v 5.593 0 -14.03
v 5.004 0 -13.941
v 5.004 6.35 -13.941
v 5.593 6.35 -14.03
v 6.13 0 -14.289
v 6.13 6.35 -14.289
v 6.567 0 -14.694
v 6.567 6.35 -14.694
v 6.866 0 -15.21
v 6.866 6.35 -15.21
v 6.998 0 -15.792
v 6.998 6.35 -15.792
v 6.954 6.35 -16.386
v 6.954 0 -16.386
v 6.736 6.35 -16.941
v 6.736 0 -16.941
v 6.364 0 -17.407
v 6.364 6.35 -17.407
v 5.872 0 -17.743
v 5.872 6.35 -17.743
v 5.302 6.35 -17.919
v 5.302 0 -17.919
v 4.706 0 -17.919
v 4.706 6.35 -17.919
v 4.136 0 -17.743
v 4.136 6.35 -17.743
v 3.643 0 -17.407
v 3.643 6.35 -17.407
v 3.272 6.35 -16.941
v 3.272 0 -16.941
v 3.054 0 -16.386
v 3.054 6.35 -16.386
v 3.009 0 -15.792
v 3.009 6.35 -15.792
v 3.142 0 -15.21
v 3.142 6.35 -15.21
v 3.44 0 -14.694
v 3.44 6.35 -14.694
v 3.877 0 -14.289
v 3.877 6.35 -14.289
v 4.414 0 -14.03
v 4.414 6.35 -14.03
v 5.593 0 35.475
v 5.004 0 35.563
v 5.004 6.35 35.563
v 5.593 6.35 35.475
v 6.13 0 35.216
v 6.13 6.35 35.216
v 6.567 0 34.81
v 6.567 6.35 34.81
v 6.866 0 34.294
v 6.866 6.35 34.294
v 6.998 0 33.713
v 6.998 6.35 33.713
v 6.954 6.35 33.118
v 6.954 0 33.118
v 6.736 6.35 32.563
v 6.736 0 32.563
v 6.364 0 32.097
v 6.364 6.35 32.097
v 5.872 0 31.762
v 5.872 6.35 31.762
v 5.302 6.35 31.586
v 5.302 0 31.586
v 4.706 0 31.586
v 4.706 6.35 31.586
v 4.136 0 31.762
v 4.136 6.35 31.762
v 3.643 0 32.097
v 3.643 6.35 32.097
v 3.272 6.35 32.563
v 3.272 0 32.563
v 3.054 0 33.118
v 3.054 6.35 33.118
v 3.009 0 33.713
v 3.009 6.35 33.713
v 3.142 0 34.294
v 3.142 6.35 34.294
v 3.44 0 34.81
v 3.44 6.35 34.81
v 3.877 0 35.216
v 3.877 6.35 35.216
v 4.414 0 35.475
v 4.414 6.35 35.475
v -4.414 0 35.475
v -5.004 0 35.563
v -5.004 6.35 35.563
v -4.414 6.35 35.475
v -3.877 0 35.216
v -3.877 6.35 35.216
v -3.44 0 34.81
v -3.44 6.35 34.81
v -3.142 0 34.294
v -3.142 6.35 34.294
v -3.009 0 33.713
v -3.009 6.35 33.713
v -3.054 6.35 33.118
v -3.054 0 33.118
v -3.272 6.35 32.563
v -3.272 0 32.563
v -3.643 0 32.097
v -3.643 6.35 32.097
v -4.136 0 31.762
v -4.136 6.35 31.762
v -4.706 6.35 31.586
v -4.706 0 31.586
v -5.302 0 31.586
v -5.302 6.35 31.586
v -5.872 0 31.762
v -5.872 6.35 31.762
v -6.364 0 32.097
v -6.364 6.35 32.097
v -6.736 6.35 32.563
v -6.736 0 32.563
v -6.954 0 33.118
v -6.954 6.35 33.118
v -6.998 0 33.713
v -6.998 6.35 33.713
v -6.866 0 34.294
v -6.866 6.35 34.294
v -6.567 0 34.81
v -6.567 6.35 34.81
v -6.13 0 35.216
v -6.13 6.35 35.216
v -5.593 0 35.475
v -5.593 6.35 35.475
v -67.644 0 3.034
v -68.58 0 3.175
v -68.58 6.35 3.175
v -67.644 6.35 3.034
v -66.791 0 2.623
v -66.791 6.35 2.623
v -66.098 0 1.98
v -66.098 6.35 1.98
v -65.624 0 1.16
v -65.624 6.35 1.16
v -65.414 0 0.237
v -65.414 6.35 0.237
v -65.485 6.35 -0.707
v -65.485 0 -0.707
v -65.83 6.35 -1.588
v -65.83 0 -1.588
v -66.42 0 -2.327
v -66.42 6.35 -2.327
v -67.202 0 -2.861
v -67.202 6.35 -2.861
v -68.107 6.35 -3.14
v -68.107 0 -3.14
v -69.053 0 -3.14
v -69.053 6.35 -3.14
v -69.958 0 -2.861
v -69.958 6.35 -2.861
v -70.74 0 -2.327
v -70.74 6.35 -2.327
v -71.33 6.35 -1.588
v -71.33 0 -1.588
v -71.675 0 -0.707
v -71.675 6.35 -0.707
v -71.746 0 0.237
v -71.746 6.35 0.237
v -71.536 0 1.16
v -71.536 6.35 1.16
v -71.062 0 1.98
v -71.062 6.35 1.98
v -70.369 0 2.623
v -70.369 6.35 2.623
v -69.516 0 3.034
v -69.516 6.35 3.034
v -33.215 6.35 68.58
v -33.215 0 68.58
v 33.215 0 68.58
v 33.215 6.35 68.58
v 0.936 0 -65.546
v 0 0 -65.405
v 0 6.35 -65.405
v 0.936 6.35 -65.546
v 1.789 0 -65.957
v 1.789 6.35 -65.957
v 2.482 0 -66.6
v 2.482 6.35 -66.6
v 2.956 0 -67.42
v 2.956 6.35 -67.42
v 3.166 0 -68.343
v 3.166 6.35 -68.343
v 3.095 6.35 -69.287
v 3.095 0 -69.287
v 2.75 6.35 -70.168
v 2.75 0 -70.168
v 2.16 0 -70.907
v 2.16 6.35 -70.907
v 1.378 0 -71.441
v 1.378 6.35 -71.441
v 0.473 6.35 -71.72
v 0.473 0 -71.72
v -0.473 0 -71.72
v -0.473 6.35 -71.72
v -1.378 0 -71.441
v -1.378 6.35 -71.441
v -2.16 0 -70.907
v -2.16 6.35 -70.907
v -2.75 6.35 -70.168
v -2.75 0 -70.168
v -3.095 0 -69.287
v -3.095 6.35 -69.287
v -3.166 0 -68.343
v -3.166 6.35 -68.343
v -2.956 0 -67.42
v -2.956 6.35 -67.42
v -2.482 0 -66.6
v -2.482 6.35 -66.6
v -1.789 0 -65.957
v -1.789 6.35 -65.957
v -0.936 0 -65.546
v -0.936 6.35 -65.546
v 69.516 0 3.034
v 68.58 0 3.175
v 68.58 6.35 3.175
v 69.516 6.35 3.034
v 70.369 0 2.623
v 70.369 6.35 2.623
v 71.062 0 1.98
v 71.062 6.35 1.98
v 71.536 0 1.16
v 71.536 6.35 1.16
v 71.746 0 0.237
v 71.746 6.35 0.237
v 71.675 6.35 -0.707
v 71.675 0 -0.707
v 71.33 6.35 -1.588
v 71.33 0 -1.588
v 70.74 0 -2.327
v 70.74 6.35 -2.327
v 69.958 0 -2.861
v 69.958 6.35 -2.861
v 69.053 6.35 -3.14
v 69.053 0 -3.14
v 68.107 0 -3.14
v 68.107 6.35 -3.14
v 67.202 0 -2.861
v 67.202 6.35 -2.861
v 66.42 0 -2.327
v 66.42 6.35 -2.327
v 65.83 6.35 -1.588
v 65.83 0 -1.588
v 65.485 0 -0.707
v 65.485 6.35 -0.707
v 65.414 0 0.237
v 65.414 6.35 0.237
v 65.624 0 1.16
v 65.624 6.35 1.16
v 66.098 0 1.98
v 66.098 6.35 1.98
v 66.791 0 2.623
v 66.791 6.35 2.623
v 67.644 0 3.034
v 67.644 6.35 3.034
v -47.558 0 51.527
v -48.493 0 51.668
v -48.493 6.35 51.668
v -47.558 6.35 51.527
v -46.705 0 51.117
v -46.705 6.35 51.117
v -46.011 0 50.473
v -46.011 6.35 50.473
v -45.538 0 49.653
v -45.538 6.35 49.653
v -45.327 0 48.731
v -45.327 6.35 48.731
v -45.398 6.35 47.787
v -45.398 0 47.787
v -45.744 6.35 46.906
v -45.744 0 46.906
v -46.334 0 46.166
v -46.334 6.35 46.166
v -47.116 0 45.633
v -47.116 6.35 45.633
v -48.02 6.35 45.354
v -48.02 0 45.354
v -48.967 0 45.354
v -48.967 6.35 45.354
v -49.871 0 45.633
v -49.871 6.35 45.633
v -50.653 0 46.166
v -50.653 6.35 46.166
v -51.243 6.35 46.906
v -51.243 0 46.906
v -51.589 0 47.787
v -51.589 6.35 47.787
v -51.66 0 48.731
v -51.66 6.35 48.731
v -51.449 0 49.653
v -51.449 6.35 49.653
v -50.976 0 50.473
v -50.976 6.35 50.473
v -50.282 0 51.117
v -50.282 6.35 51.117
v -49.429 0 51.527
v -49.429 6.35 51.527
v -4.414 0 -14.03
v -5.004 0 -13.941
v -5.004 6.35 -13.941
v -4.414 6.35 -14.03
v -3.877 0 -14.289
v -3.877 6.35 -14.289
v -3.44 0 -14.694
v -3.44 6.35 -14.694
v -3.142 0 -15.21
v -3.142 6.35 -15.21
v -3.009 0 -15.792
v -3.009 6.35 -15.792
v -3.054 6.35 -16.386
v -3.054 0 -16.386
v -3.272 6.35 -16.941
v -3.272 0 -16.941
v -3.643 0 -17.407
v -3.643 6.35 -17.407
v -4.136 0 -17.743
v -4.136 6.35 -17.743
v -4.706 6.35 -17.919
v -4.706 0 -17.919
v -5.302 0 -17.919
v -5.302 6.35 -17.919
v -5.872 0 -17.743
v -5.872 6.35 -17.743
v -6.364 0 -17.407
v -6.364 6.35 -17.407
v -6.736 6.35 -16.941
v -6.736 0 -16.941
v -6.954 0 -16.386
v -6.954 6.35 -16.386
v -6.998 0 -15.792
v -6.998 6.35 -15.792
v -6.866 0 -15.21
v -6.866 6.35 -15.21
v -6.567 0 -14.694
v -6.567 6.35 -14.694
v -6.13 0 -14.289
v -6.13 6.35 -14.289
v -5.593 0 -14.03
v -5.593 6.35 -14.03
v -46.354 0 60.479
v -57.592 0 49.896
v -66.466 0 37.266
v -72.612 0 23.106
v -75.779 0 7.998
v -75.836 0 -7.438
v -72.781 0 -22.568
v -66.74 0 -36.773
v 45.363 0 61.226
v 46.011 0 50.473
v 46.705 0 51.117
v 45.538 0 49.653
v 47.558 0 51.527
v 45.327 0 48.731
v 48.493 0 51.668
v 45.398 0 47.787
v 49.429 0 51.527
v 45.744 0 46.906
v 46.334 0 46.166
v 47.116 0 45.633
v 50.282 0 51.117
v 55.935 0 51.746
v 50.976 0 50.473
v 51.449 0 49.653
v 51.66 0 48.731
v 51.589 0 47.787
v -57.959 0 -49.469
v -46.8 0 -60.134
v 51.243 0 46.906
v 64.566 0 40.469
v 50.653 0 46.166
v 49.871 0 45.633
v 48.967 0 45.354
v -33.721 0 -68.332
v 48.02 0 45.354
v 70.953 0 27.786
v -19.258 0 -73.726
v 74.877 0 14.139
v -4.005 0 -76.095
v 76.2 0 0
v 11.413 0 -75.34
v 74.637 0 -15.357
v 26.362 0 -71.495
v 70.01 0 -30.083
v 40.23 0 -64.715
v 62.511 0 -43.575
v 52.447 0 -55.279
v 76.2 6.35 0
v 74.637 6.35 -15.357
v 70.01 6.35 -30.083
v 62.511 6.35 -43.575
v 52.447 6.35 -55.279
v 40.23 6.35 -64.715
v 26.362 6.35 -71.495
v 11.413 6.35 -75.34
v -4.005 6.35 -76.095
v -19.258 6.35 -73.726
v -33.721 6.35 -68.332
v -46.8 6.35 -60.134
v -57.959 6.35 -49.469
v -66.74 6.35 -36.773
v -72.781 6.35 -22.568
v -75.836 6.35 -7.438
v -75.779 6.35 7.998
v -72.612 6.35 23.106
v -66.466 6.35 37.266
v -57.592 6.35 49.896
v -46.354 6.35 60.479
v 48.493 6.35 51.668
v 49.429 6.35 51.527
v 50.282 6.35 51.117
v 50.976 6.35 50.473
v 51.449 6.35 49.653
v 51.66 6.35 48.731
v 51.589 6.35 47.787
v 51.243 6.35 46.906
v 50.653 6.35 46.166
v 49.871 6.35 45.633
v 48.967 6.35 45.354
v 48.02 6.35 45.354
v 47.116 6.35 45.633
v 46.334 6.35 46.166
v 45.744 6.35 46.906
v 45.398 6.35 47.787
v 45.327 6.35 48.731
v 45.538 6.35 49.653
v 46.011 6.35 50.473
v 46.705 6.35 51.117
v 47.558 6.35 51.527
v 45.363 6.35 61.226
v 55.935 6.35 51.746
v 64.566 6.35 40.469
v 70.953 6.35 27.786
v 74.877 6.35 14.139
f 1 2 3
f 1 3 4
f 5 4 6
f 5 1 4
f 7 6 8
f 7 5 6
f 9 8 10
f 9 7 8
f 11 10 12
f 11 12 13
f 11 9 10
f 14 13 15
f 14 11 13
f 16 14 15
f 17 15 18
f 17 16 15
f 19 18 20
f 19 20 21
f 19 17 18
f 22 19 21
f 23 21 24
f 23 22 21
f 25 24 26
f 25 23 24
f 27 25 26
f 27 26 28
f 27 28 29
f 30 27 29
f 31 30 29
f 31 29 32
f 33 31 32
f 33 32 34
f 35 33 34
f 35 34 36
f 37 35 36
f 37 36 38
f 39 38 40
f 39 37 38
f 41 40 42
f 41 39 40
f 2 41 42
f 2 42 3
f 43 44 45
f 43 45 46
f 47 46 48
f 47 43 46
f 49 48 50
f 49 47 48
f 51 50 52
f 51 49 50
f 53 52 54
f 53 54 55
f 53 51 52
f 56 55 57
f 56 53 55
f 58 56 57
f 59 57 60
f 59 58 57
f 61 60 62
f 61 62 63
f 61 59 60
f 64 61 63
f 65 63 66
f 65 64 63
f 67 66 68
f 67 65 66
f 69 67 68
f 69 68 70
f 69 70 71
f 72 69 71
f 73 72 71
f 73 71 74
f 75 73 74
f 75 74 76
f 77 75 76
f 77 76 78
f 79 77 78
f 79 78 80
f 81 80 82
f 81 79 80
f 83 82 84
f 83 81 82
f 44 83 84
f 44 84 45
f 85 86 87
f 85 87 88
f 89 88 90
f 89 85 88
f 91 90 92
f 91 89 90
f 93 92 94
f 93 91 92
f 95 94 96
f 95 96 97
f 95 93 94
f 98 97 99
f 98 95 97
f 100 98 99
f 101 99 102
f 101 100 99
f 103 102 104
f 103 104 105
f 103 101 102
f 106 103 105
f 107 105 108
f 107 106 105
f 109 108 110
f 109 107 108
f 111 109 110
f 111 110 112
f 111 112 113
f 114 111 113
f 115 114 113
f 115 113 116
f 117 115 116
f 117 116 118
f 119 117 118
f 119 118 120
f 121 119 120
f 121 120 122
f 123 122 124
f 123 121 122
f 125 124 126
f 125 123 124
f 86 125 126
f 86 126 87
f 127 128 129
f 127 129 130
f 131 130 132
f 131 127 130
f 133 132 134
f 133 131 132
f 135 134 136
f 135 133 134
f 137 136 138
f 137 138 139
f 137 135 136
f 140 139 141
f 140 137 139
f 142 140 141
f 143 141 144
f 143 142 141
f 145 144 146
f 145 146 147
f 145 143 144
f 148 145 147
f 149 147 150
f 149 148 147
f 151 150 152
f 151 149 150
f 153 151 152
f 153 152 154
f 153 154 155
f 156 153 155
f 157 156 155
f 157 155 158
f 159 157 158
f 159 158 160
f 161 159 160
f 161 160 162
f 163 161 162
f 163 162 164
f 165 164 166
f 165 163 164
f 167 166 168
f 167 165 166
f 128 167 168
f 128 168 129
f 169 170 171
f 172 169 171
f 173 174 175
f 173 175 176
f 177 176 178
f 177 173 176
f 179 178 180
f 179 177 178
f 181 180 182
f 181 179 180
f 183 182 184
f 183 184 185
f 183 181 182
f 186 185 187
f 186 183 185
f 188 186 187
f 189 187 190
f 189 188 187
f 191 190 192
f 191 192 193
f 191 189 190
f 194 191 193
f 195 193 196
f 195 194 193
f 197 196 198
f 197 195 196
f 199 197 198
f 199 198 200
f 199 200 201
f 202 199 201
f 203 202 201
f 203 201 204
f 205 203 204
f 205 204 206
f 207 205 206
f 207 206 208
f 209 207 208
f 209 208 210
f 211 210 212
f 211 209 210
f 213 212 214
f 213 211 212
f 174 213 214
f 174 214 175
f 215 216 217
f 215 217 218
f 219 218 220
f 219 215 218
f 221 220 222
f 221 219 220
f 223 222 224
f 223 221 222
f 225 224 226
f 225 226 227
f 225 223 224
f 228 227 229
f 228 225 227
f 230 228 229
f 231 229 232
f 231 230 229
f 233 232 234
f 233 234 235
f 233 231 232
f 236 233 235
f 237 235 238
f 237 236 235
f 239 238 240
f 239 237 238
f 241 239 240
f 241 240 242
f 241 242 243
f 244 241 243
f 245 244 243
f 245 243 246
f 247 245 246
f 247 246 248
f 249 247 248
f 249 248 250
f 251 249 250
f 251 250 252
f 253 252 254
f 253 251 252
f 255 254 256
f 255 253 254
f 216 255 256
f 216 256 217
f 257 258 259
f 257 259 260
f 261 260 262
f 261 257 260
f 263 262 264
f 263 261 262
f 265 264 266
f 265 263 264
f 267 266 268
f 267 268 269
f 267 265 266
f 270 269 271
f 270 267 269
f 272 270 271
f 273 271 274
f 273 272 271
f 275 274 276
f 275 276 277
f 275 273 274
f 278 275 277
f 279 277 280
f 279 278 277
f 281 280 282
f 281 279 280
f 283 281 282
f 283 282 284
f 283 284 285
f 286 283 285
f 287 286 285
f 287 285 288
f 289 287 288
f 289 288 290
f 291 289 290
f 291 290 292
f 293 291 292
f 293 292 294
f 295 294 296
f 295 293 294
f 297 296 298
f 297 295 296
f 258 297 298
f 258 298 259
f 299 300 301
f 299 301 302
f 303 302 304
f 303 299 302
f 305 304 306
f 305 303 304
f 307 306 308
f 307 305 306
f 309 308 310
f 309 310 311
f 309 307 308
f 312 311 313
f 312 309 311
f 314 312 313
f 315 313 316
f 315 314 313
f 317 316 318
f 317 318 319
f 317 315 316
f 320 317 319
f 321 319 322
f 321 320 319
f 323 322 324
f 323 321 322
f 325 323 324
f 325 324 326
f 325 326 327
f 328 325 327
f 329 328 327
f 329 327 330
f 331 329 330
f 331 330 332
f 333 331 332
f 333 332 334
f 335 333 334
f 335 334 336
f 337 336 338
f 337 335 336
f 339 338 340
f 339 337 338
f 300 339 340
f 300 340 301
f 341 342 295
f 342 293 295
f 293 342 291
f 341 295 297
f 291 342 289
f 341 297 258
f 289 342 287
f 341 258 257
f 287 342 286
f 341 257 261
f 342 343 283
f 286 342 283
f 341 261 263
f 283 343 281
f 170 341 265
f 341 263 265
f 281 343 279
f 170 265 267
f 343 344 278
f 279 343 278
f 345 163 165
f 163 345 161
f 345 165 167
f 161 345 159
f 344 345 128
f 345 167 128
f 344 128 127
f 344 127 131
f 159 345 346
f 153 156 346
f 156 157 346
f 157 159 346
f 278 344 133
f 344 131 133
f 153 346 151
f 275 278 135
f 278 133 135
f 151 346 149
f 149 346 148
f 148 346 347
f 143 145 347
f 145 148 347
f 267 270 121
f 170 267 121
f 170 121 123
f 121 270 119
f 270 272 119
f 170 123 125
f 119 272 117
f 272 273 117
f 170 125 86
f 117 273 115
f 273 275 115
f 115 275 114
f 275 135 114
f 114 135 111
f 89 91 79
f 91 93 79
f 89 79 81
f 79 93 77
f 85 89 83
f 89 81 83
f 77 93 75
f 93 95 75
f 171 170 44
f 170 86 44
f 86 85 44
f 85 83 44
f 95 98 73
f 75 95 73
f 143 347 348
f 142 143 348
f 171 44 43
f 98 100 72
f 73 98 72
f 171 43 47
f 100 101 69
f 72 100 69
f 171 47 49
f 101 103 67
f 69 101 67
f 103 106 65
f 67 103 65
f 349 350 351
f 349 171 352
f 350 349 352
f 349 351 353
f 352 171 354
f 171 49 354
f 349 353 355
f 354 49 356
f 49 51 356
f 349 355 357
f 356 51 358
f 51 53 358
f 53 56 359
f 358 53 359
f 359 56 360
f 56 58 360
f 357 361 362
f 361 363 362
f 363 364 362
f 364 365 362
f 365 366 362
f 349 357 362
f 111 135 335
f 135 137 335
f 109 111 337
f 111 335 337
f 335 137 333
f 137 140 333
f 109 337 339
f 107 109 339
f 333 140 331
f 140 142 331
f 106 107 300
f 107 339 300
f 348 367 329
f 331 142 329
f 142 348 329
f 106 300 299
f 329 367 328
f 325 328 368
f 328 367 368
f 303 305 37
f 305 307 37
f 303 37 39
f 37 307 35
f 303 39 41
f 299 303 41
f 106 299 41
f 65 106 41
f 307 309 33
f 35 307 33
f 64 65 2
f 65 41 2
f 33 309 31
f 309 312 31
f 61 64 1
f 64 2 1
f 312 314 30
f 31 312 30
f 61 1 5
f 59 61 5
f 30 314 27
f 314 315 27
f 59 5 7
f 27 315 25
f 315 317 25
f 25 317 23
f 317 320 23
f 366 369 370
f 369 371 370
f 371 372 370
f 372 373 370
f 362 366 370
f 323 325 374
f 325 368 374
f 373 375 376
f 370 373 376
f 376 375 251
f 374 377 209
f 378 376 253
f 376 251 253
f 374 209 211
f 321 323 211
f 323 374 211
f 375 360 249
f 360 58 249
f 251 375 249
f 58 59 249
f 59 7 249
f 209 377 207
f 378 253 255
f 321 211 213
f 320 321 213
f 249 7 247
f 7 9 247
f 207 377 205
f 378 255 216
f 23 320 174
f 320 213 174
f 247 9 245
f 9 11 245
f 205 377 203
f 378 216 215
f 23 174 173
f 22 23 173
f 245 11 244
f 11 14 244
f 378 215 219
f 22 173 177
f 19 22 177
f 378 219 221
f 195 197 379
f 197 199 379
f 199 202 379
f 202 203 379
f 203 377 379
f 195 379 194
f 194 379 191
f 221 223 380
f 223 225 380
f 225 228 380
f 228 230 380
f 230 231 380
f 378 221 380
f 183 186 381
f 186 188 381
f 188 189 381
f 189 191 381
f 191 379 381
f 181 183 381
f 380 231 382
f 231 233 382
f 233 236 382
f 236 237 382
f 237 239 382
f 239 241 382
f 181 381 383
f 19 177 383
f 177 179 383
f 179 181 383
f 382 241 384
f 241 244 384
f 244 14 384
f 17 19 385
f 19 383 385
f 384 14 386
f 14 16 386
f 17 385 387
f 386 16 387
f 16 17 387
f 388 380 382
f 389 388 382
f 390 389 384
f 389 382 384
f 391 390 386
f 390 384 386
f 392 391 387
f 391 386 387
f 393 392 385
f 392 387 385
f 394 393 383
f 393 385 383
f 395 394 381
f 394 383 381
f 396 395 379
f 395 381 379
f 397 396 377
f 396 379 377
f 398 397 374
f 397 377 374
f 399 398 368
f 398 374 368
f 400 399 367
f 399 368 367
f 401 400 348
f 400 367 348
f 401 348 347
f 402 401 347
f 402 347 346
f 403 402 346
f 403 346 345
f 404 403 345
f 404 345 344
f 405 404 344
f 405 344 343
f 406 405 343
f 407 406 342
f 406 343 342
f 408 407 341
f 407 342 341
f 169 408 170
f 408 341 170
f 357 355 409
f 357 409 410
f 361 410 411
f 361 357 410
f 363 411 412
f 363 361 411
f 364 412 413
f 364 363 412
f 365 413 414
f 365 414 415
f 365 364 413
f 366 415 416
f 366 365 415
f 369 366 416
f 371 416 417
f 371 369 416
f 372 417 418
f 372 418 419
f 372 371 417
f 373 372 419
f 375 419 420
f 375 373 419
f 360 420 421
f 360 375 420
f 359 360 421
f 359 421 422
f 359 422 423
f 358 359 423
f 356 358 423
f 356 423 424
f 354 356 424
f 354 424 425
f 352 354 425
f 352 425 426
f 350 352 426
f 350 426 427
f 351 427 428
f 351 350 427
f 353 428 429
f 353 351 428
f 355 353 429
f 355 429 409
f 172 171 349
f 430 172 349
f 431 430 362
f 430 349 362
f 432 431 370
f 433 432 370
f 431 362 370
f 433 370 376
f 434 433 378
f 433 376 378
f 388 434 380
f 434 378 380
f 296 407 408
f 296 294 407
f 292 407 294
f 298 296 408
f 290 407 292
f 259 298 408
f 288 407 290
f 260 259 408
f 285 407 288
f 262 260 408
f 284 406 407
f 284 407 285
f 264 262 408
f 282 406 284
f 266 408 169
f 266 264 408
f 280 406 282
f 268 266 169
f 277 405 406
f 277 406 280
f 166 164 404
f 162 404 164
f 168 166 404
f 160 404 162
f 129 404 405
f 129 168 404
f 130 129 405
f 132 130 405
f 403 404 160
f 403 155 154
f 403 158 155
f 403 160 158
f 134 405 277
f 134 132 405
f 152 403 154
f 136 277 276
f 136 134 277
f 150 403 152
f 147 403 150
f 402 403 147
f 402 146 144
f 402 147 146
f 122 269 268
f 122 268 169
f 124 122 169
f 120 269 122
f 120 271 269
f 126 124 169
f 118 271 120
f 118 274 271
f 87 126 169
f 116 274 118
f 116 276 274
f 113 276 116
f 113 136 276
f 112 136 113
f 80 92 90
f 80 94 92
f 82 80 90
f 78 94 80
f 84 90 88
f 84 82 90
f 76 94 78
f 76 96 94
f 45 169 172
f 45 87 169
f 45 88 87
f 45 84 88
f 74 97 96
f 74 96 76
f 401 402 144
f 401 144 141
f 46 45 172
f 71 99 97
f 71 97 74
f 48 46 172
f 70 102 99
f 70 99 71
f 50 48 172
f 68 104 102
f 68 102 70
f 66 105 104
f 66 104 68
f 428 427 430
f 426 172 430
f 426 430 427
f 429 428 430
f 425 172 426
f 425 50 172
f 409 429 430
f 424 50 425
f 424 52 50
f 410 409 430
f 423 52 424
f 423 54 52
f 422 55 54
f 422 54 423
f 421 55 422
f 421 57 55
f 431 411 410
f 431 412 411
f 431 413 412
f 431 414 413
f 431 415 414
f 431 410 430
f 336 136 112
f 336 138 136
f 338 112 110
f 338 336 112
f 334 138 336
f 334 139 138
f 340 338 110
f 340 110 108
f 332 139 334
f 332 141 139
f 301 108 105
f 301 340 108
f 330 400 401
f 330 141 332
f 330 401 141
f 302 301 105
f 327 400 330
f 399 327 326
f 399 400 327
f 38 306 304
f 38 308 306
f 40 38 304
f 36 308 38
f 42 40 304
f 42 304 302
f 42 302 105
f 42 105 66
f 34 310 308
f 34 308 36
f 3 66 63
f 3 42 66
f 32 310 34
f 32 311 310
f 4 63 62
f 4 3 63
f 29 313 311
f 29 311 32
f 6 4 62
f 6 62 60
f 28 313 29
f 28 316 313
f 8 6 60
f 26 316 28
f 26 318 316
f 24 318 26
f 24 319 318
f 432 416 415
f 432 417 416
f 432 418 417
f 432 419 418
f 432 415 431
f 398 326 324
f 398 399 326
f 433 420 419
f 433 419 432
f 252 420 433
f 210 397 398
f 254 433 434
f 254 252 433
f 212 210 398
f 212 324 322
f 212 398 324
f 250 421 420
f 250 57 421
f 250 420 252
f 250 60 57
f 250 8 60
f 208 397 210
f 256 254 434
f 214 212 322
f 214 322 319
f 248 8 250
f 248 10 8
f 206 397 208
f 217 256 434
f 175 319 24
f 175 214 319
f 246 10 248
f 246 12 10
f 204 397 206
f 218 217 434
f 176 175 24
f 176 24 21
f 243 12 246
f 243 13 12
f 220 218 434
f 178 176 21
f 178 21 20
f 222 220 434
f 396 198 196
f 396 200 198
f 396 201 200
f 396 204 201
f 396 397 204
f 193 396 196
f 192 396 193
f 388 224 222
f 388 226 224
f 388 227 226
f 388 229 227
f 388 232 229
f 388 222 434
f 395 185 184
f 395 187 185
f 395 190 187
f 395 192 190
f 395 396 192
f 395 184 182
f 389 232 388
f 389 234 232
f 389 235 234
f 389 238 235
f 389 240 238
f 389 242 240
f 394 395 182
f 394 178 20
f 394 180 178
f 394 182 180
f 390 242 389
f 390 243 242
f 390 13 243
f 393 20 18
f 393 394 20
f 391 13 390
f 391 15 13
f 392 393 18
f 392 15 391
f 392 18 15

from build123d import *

# Parameters (mm, degrees)
SKETCH1_R           = 3.175
SKETCH1_R_2         = 2
BOSS_EXTRUDE1_DEPTH = 6.35


with BuildPart() as part:
    # Sketch1 → Boss-Extrude1 (new body)
    with BuildSketch(Plane(origin=(0, 0, 0), x_dir=(1, 0, 0), z_dir=(0, 1, 0))):
        with BuildLine():
            Line((-33.21480995, -68.58), (33.21480995, -68.58))
            ThreePointArc((33.21480995, -68.58), (64.565503631, -40.46894786), (76.2, 0))
            ThreePointArc((76.2, 0), (-40.46894786, 64.565503631), (-33.21480995, -68.58))
        make_face()
        with Locations(Location((-48.493383054, -48.493383054, 0), (0, 0, 270))):
            Circle(SKETCH1_R, mode=Mode.SUBTRACT)
        with Locations(Location((-5.0038, -33.563454663, 0), (0, 0, 270))):
            Circle(SKETCH1_R_2, mode=Mode.SUBTRACT)
        with Locations(Location((48.493383054, -48.493383054, 0), (0, 0, 270))):
            Circle(SKETCH1_R, mode=Mode.SUBTRACT)
        with Locations(Location((5.0038, -33.563454663, 0), (0, 0, 270))):
            Circle(SKETCH1_R_2, mode=Mode.SUBTRACT)
        with Locations(Location((-68.58, 0, 0), (0, 0, 270))):
            Circle(SKETCH1_R, mode=Mode.SUBTRACT)
        with Locations(Location((-5.0038, 15.941145337, 0), (0, 0, 270))):
            Circle(SKETCH1_R_2, mode=Mode.SUBTRACT)
        with Locations(Location((5.0038, 15.941145337, 0), (0, 0, 270))):
            Circle(SKETCH1_R_2, mode=Mode.SUBTRACT)
        with Locations(Location((68.58, 0, 0), (0, 0, 270))):
            Circle(SKETCH1_R, mode=Mode.SUBTRACT)
        with Locations(Location((0, 68.58, 0), (0, 0, 270))):
            Circle(SKETCH1_R, mode=Mode.SUBTRACT)
    extrude(amount=BOSS_EXTRUDE1_DEPTH)


solid = part.part
